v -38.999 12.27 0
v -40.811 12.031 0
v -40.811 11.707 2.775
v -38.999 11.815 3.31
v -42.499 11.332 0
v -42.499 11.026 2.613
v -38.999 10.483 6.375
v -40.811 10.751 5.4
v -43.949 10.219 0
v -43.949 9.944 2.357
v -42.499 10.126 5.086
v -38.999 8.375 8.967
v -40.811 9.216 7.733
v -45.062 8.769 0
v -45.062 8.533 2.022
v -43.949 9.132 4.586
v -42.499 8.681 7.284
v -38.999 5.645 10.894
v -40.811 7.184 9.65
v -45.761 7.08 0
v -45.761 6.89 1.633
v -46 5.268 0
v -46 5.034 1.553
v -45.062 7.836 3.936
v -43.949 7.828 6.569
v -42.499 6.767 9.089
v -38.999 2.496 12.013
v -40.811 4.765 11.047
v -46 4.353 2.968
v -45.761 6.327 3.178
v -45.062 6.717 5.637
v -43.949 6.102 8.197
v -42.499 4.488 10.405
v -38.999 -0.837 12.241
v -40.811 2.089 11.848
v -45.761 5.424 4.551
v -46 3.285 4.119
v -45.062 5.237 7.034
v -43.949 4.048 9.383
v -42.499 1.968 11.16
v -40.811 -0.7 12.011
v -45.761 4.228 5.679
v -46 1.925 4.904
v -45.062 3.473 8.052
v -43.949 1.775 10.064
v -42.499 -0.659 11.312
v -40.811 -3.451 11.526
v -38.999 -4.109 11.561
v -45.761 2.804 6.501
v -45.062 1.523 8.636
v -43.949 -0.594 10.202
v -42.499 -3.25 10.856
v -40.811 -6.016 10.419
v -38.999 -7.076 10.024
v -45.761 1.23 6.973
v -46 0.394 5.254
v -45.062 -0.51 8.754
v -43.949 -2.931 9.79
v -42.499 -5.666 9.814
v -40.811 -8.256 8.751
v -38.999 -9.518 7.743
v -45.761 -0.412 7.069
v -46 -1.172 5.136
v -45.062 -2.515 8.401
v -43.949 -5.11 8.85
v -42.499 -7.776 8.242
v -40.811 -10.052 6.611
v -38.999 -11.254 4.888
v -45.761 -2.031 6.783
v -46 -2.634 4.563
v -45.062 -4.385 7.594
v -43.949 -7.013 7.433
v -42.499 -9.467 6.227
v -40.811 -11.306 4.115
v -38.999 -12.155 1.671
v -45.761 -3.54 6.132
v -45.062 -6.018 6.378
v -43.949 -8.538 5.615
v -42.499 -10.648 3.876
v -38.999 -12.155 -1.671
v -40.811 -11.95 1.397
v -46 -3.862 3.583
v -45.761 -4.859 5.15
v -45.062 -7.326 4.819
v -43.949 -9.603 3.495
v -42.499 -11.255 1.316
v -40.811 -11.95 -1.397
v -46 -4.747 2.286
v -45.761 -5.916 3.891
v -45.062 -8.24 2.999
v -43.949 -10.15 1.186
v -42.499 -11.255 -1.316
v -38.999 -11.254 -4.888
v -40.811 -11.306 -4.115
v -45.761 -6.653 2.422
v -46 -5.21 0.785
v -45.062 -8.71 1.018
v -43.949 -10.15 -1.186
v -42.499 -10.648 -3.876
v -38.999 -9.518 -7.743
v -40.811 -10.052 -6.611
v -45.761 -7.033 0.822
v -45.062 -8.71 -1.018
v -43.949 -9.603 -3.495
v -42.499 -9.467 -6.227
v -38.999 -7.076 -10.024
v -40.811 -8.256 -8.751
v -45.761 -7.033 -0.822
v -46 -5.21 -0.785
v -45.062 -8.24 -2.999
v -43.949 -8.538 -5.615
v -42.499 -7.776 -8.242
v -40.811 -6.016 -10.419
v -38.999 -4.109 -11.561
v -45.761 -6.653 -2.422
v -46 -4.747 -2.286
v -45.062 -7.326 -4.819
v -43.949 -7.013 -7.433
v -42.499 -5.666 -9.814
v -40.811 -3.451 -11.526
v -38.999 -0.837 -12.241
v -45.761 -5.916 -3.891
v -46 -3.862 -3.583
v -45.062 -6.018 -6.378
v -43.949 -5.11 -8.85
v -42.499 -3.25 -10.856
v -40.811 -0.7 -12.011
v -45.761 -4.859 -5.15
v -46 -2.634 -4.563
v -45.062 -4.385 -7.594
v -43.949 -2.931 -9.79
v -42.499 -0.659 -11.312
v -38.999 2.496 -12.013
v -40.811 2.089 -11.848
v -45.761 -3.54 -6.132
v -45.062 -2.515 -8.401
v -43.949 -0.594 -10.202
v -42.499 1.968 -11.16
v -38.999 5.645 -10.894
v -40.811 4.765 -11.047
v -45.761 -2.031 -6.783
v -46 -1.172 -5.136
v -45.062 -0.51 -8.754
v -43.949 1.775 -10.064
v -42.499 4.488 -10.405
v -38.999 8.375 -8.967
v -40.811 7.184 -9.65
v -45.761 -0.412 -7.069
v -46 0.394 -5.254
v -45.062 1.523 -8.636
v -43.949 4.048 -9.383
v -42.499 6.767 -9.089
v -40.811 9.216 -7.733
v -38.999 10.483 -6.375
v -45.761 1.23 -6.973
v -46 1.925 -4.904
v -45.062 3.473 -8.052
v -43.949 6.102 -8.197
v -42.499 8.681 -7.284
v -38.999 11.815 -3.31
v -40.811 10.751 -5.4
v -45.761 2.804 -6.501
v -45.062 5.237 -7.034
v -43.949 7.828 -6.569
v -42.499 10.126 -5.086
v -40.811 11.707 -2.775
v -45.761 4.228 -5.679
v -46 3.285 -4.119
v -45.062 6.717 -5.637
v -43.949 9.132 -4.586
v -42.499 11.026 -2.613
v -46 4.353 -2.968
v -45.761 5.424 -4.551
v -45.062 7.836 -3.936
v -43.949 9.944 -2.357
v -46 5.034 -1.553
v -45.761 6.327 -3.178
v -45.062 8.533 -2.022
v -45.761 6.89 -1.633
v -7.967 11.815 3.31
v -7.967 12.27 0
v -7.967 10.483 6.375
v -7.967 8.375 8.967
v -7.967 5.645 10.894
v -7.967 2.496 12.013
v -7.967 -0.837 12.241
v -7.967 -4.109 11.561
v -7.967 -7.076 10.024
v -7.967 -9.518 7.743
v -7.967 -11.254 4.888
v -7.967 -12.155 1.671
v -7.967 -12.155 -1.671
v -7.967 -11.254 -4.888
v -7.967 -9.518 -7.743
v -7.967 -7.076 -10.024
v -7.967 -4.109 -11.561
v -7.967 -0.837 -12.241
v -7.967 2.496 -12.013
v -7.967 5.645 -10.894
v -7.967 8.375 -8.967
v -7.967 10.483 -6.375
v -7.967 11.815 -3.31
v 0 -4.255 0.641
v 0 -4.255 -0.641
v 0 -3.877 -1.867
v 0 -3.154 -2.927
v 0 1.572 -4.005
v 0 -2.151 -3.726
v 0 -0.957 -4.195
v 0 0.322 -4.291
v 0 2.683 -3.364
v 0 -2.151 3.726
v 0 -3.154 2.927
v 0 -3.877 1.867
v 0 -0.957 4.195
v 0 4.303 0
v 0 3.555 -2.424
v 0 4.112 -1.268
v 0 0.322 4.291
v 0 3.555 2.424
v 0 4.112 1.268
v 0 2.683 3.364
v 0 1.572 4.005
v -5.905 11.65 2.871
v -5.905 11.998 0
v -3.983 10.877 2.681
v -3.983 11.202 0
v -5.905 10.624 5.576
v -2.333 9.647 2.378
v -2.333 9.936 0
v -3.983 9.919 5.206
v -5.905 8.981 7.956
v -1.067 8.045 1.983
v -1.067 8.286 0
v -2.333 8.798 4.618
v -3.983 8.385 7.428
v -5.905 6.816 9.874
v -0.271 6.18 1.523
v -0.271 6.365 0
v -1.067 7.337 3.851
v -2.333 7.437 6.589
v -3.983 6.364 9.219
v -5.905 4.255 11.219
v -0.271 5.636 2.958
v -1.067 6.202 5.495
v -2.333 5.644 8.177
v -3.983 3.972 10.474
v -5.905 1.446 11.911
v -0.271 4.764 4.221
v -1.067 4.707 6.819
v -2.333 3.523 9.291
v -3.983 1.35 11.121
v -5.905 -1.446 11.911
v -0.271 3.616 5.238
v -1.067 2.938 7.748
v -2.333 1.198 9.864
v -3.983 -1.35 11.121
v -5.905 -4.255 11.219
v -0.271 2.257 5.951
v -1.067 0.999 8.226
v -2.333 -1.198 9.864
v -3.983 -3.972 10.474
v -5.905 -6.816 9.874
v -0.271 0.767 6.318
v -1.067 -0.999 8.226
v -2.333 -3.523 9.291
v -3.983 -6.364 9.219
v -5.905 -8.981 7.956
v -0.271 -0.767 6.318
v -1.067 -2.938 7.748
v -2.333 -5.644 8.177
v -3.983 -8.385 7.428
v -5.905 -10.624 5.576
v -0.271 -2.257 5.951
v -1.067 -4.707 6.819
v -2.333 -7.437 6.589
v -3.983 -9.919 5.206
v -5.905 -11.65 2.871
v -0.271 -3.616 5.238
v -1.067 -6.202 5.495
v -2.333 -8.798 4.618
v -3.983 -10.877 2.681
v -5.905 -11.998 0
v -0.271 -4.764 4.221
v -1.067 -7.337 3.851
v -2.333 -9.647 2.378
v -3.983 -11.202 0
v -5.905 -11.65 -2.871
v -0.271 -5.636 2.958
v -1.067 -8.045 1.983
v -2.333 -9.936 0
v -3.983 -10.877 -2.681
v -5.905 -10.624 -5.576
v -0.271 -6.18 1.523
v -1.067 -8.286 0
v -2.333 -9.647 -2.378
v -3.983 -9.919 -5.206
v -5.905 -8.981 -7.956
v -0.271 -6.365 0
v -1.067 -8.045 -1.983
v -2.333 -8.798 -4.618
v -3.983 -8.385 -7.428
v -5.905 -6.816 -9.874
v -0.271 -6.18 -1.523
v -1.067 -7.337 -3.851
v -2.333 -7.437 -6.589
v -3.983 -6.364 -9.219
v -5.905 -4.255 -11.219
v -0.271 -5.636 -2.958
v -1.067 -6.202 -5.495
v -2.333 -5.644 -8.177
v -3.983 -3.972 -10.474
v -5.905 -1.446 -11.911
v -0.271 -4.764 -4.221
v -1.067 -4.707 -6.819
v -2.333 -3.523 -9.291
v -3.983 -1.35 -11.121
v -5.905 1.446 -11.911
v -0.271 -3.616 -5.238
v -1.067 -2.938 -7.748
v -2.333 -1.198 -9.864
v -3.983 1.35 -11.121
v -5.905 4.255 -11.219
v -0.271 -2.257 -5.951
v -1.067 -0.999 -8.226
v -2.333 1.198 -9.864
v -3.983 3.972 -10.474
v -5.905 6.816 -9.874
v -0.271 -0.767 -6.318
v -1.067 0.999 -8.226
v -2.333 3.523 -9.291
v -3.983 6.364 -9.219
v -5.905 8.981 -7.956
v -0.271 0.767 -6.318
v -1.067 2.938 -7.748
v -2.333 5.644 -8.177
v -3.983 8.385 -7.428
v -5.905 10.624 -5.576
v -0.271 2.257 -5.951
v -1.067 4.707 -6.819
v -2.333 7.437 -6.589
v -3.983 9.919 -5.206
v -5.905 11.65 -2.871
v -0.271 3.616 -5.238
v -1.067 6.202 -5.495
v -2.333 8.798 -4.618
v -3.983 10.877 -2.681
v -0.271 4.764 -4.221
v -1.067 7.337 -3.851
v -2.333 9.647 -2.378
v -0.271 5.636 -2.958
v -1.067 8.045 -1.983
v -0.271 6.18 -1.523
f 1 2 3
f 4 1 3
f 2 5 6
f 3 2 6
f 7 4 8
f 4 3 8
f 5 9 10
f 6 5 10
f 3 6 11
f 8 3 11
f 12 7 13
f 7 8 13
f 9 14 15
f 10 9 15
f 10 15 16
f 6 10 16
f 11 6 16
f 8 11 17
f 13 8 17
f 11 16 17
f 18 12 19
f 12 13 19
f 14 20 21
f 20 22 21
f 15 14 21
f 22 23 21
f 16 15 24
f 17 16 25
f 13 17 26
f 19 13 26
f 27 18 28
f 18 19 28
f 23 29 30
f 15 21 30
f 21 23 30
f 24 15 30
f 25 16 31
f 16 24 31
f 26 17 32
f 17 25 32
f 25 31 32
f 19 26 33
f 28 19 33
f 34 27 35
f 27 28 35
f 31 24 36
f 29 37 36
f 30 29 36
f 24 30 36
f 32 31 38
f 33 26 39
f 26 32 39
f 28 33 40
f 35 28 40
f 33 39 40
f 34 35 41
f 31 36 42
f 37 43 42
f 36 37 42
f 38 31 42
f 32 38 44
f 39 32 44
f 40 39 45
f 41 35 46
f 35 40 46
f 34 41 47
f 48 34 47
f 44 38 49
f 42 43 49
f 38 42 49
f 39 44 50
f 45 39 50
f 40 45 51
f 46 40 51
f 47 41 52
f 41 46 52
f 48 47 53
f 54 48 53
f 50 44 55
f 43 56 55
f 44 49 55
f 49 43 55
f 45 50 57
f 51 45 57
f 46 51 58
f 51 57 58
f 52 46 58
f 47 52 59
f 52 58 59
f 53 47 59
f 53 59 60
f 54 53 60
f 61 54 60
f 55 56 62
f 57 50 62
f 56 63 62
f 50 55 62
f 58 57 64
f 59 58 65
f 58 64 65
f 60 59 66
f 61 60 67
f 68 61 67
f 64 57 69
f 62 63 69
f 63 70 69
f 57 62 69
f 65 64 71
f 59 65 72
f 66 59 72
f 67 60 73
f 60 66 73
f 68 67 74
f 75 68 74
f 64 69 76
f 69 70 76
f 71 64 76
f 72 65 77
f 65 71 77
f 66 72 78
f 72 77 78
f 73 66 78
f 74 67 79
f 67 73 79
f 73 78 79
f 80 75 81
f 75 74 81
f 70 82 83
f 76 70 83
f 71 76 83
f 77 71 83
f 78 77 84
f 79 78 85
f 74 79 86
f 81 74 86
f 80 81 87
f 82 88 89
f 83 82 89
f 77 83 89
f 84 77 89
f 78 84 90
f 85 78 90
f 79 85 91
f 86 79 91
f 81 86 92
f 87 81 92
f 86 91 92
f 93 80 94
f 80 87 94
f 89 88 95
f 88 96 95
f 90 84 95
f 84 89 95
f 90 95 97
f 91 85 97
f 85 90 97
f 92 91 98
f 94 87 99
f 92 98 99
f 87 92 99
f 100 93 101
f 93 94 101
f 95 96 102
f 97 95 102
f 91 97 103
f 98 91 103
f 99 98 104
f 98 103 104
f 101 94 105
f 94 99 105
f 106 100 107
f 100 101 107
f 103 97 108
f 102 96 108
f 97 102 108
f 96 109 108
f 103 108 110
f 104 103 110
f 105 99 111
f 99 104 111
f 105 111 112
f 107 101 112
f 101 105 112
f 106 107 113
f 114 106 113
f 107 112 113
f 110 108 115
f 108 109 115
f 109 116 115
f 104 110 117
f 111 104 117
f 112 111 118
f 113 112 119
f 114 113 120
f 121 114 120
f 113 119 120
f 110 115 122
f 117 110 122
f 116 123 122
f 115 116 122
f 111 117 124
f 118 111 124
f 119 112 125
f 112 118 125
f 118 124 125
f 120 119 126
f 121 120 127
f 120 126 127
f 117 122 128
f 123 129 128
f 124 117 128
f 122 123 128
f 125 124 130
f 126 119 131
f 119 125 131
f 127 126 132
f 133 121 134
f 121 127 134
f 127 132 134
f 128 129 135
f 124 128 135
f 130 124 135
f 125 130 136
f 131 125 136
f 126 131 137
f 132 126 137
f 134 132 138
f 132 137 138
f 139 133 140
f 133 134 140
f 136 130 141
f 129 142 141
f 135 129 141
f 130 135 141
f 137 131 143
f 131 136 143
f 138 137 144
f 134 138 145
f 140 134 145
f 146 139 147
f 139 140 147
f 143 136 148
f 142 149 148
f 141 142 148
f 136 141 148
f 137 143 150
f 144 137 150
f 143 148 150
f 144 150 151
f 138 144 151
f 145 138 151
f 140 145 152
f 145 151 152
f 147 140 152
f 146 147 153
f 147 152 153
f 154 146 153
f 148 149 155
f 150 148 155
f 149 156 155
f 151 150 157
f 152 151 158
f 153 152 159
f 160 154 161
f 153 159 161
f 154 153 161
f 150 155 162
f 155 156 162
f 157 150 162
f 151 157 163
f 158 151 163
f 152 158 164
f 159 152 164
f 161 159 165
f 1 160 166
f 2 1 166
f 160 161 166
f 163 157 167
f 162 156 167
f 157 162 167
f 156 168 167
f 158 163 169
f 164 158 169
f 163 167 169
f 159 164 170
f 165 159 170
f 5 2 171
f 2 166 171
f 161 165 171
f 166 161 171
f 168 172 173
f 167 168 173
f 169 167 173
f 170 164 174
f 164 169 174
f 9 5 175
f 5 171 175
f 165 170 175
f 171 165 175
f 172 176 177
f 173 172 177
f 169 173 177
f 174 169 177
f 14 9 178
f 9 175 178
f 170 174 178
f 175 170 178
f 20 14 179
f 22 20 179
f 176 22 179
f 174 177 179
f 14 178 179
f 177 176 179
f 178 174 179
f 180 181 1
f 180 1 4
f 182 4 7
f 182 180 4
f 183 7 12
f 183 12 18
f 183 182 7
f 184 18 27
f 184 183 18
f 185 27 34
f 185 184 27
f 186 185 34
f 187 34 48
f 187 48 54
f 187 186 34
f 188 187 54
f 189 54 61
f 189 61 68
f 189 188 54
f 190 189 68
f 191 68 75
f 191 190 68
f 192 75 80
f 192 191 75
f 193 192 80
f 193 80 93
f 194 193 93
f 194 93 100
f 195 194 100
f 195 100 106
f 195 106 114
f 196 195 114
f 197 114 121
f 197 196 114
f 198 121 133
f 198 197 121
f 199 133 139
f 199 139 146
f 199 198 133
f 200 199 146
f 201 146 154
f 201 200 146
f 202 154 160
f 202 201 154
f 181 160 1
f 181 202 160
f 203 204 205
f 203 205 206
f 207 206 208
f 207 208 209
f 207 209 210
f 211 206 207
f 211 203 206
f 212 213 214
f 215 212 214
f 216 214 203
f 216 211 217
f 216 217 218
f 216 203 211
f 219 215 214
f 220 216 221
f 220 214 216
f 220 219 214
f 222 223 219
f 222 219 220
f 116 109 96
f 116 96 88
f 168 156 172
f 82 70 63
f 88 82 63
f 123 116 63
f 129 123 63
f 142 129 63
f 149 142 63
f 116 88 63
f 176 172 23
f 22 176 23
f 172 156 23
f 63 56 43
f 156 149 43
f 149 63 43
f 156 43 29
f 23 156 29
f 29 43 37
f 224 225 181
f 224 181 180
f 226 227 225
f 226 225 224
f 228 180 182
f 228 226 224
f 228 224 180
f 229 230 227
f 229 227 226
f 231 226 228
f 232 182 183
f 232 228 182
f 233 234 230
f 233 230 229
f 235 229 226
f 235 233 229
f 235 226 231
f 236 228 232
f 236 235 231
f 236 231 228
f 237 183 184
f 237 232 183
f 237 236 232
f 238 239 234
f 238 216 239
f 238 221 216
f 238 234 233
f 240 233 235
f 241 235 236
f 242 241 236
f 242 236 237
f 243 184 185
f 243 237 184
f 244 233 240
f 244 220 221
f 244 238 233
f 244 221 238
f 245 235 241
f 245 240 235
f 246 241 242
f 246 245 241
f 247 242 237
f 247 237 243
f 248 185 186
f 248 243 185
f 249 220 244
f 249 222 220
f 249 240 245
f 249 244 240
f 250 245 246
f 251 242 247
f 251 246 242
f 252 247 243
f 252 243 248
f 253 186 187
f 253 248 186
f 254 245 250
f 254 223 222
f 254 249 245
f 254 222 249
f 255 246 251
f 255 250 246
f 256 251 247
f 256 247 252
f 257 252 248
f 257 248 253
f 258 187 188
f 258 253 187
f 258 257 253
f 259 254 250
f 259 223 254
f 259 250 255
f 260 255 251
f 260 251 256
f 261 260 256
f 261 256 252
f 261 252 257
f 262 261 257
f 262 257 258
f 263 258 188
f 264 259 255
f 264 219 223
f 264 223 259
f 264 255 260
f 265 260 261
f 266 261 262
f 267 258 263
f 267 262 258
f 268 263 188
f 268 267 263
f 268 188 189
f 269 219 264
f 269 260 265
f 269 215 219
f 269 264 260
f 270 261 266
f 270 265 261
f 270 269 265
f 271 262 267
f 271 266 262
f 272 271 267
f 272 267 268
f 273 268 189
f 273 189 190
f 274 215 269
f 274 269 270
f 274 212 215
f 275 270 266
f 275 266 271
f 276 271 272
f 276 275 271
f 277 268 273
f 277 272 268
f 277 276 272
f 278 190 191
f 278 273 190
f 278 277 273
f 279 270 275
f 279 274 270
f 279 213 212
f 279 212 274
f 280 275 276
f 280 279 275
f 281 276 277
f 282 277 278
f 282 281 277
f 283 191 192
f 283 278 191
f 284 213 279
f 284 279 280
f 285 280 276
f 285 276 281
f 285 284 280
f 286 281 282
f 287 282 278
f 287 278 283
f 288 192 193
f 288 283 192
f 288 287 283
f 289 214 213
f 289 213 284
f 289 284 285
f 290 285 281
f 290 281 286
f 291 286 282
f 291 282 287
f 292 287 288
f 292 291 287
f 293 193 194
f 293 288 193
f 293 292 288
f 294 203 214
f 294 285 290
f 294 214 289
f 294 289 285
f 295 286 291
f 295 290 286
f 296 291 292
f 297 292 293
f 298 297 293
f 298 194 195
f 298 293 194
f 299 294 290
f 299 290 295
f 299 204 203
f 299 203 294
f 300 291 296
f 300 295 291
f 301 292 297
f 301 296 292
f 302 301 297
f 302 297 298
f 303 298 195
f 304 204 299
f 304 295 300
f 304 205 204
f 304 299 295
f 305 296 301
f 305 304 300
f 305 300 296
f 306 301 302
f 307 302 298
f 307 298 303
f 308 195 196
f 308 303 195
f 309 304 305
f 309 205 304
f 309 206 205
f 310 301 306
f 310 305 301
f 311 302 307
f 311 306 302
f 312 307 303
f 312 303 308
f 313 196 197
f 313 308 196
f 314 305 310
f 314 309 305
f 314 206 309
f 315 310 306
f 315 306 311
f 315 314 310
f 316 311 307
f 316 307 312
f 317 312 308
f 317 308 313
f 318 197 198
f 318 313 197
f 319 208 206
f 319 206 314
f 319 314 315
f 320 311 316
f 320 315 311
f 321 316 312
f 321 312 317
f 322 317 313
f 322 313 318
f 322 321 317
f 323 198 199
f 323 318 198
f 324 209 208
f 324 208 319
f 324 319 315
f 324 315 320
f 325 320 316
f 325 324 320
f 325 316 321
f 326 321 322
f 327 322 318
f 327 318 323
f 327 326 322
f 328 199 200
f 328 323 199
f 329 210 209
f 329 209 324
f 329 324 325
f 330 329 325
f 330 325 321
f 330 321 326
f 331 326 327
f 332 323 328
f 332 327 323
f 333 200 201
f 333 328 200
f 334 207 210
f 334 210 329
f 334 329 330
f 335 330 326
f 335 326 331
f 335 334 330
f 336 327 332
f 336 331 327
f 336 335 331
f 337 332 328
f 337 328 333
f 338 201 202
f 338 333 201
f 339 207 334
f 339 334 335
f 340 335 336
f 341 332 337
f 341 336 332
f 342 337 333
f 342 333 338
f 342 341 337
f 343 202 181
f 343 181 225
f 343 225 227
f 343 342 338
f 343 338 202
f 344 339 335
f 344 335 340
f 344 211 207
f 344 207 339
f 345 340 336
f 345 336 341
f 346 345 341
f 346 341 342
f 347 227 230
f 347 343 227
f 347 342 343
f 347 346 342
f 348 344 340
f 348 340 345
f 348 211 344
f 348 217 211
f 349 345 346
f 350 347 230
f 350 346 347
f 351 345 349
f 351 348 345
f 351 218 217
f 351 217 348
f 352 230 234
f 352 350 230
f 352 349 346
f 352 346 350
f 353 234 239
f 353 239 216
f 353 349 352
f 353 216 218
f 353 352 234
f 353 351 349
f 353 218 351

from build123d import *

# Parameters (mm, degrees)
F0_R     = 12.269655
F1_DEPTH = 46
F2_R     = 7.001219
F3_R     = 7.966905


with BuildPart() as f1:
    # F0 (on Right) → F1 (new body)
    with BuildSketch(Plane.YZ):
        Circle(F0_R)
    extrude(amount=-F1_DEPTH)

    # F2
    f2_edges = [f1.edges().sort_by_distance(p)[0] for p in [
        (-46, -12.269655, 0),
    ]]
    fillet(f2_edges, radius=F2_R)

    # F3
    f3_edges = [f1.edges().sort_by_distance(p)[0] for p in [
        (0, -12.269655, 0),
    ]]
    fillet(f3_edges, radius=F3_R)


solid = f1.part
